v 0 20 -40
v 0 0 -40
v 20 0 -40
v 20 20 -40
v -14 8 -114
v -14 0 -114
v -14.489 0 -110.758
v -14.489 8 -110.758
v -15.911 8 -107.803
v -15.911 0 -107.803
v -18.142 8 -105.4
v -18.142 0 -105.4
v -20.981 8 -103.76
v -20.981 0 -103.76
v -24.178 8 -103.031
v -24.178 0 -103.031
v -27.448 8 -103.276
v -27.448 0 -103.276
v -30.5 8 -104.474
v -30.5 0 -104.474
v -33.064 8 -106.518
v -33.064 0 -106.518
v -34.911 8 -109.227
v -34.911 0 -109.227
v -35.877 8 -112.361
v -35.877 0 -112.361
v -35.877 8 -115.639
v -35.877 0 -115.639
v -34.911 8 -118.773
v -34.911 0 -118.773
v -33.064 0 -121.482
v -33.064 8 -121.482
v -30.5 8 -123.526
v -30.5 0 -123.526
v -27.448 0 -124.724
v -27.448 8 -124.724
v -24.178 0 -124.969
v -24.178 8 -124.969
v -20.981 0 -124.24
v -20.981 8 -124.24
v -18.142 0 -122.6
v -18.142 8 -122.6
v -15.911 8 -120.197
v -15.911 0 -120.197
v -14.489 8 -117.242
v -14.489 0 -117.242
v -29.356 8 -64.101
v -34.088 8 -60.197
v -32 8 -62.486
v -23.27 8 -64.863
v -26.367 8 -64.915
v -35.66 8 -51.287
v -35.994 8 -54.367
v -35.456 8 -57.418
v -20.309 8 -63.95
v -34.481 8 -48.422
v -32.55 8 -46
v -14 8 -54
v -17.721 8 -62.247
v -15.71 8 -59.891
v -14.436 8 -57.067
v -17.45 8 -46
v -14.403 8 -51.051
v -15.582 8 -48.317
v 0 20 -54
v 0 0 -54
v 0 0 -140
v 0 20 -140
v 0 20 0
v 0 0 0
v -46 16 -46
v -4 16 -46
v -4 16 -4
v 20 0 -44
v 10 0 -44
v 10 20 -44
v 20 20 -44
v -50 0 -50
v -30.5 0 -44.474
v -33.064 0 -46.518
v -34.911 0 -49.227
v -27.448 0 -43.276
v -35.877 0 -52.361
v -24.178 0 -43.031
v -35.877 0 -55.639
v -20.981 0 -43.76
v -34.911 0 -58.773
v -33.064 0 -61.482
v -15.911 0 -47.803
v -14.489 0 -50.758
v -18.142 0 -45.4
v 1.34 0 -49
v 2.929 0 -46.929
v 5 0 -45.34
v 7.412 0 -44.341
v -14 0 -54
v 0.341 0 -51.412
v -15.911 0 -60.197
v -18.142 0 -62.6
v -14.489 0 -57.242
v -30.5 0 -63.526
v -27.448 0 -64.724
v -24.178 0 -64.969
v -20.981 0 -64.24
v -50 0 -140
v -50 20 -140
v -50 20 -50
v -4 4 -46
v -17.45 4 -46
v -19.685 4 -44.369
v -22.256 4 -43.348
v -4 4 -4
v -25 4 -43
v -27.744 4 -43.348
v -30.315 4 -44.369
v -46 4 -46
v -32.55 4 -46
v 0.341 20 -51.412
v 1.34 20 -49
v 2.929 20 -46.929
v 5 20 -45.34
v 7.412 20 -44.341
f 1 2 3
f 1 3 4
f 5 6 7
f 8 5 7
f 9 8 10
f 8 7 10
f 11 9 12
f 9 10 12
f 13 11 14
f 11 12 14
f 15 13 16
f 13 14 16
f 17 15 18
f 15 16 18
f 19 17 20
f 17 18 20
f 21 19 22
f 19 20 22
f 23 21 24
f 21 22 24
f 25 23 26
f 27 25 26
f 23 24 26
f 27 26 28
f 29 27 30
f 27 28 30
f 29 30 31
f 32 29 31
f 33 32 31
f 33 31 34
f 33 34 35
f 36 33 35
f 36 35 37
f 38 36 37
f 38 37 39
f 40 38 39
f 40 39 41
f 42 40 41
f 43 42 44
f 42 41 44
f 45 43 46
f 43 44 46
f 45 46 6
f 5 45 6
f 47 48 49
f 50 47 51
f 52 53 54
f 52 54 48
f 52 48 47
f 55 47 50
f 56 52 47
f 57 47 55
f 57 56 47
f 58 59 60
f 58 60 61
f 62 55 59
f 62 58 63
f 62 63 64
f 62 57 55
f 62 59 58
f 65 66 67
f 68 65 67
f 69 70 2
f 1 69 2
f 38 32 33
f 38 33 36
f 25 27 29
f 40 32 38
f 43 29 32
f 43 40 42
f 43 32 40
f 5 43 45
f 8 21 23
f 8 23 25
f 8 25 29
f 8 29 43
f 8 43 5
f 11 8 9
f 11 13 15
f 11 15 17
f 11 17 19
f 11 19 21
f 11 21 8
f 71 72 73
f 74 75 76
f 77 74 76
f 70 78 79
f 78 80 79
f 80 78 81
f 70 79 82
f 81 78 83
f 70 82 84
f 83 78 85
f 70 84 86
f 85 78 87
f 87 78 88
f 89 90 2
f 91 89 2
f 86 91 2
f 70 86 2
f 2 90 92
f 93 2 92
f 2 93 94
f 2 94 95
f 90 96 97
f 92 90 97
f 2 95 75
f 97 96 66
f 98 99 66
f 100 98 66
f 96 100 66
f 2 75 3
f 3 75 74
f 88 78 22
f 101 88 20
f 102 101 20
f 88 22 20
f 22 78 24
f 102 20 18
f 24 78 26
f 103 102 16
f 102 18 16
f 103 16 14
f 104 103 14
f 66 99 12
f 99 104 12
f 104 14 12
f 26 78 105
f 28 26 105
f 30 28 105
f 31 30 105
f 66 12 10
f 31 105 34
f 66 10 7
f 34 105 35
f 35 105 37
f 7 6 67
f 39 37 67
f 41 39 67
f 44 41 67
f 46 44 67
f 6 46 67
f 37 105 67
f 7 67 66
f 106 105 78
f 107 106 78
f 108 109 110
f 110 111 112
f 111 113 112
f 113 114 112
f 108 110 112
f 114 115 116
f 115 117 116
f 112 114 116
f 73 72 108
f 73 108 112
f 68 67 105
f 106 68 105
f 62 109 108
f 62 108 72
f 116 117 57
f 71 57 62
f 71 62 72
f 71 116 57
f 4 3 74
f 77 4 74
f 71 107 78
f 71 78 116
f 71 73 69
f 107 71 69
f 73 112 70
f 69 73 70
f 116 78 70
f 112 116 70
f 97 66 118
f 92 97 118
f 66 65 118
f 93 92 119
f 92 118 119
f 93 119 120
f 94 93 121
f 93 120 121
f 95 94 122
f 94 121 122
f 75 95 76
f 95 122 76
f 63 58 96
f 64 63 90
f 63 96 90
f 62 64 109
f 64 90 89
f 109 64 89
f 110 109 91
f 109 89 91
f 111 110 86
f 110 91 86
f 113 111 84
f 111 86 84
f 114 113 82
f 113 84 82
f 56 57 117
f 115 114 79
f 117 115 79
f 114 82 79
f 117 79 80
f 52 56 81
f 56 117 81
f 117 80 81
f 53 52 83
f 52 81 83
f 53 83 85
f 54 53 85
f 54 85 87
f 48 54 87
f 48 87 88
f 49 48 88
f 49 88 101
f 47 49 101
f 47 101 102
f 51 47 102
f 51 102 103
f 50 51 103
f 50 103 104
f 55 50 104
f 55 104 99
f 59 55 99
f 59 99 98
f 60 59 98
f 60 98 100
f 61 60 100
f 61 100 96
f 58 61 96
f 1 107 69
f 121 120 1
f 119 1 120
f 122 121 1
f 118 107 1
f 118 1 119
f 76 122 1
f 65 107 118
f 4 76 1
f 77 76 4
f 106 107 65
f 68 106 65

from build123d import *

# Parameters (mm, degrees)
BOSS_EXTRUDE1_DEPTH = 20
SKETCH2_W           = 4
SKETCH2_H           = 20
BOSS_EXTRUDE2_DEPTH = 20
SKETCH3_W           = 46
SKETCH3_H           = 12
CUT_EXTRUDE1_DEPTH  = 46
SKETCH4_R           = 11
CUT_EXTRUDE2_DEPTH  = 8
FILLET1_R           = 10


with BuildPart() as part:
    # Sketch1 → Boss-Extrude1 (new body)
    with BuildSketch(Plane(origin=(0, 0, 0), x_dir=(1, 0, 0), z_dir=(0, 1, 0))):
        Polygon((-50, 50), (0, 0), (0, 140), (-50, 140), align=None)
    extrude(amount=BOSS_EXTRUDE1_DEPTH)

    # Sketch2 → Boss-Extrude2 (add)
    with BuildSketch(Plane(origin=(0, 0, 0), x_dir=(0, 0, -1), z_dir=(1, 0, 0))):
        with Locations((42, 10)):
            Rectangle(SKETCH2_W, SKETCH2_H)
    extrude(amount=BOSS_EXTRUDE2_DEPTH)

    # Sketch3 → Cut-Extrude1 (cut)
    with BuildSketch(Plane.ZY.offset(50)):
        with Locations((-23, 10)):
            Rectangle(SKETCH3_W, SKETCH3_H)
    extrude(amount=-CUT_EXTRUDE1_DEPTH, mode=Mode.SUBTRACT)

    # Sketch4 → Cut-Extrude2 (cut)
    with BuildSketch(Plane.XZ):
        with Locations((-25, -54)):
            Circle(SKETCH4_R)
        with Locations((-25, -114)):
            Circle(SKETCH4_R)
    extrude(amount=-CUT_EXTRUDE2_DEPTH, mode=Mode.SUBTRACT)

    # Fillet1
    fillet1_edges = [part.edges().sort_by_distance(p)[0] for p in [
        (0, 10, -44),
    ]]
    fillet(fillet1_edges, radius=FILLET1_R)


solid = part.part
